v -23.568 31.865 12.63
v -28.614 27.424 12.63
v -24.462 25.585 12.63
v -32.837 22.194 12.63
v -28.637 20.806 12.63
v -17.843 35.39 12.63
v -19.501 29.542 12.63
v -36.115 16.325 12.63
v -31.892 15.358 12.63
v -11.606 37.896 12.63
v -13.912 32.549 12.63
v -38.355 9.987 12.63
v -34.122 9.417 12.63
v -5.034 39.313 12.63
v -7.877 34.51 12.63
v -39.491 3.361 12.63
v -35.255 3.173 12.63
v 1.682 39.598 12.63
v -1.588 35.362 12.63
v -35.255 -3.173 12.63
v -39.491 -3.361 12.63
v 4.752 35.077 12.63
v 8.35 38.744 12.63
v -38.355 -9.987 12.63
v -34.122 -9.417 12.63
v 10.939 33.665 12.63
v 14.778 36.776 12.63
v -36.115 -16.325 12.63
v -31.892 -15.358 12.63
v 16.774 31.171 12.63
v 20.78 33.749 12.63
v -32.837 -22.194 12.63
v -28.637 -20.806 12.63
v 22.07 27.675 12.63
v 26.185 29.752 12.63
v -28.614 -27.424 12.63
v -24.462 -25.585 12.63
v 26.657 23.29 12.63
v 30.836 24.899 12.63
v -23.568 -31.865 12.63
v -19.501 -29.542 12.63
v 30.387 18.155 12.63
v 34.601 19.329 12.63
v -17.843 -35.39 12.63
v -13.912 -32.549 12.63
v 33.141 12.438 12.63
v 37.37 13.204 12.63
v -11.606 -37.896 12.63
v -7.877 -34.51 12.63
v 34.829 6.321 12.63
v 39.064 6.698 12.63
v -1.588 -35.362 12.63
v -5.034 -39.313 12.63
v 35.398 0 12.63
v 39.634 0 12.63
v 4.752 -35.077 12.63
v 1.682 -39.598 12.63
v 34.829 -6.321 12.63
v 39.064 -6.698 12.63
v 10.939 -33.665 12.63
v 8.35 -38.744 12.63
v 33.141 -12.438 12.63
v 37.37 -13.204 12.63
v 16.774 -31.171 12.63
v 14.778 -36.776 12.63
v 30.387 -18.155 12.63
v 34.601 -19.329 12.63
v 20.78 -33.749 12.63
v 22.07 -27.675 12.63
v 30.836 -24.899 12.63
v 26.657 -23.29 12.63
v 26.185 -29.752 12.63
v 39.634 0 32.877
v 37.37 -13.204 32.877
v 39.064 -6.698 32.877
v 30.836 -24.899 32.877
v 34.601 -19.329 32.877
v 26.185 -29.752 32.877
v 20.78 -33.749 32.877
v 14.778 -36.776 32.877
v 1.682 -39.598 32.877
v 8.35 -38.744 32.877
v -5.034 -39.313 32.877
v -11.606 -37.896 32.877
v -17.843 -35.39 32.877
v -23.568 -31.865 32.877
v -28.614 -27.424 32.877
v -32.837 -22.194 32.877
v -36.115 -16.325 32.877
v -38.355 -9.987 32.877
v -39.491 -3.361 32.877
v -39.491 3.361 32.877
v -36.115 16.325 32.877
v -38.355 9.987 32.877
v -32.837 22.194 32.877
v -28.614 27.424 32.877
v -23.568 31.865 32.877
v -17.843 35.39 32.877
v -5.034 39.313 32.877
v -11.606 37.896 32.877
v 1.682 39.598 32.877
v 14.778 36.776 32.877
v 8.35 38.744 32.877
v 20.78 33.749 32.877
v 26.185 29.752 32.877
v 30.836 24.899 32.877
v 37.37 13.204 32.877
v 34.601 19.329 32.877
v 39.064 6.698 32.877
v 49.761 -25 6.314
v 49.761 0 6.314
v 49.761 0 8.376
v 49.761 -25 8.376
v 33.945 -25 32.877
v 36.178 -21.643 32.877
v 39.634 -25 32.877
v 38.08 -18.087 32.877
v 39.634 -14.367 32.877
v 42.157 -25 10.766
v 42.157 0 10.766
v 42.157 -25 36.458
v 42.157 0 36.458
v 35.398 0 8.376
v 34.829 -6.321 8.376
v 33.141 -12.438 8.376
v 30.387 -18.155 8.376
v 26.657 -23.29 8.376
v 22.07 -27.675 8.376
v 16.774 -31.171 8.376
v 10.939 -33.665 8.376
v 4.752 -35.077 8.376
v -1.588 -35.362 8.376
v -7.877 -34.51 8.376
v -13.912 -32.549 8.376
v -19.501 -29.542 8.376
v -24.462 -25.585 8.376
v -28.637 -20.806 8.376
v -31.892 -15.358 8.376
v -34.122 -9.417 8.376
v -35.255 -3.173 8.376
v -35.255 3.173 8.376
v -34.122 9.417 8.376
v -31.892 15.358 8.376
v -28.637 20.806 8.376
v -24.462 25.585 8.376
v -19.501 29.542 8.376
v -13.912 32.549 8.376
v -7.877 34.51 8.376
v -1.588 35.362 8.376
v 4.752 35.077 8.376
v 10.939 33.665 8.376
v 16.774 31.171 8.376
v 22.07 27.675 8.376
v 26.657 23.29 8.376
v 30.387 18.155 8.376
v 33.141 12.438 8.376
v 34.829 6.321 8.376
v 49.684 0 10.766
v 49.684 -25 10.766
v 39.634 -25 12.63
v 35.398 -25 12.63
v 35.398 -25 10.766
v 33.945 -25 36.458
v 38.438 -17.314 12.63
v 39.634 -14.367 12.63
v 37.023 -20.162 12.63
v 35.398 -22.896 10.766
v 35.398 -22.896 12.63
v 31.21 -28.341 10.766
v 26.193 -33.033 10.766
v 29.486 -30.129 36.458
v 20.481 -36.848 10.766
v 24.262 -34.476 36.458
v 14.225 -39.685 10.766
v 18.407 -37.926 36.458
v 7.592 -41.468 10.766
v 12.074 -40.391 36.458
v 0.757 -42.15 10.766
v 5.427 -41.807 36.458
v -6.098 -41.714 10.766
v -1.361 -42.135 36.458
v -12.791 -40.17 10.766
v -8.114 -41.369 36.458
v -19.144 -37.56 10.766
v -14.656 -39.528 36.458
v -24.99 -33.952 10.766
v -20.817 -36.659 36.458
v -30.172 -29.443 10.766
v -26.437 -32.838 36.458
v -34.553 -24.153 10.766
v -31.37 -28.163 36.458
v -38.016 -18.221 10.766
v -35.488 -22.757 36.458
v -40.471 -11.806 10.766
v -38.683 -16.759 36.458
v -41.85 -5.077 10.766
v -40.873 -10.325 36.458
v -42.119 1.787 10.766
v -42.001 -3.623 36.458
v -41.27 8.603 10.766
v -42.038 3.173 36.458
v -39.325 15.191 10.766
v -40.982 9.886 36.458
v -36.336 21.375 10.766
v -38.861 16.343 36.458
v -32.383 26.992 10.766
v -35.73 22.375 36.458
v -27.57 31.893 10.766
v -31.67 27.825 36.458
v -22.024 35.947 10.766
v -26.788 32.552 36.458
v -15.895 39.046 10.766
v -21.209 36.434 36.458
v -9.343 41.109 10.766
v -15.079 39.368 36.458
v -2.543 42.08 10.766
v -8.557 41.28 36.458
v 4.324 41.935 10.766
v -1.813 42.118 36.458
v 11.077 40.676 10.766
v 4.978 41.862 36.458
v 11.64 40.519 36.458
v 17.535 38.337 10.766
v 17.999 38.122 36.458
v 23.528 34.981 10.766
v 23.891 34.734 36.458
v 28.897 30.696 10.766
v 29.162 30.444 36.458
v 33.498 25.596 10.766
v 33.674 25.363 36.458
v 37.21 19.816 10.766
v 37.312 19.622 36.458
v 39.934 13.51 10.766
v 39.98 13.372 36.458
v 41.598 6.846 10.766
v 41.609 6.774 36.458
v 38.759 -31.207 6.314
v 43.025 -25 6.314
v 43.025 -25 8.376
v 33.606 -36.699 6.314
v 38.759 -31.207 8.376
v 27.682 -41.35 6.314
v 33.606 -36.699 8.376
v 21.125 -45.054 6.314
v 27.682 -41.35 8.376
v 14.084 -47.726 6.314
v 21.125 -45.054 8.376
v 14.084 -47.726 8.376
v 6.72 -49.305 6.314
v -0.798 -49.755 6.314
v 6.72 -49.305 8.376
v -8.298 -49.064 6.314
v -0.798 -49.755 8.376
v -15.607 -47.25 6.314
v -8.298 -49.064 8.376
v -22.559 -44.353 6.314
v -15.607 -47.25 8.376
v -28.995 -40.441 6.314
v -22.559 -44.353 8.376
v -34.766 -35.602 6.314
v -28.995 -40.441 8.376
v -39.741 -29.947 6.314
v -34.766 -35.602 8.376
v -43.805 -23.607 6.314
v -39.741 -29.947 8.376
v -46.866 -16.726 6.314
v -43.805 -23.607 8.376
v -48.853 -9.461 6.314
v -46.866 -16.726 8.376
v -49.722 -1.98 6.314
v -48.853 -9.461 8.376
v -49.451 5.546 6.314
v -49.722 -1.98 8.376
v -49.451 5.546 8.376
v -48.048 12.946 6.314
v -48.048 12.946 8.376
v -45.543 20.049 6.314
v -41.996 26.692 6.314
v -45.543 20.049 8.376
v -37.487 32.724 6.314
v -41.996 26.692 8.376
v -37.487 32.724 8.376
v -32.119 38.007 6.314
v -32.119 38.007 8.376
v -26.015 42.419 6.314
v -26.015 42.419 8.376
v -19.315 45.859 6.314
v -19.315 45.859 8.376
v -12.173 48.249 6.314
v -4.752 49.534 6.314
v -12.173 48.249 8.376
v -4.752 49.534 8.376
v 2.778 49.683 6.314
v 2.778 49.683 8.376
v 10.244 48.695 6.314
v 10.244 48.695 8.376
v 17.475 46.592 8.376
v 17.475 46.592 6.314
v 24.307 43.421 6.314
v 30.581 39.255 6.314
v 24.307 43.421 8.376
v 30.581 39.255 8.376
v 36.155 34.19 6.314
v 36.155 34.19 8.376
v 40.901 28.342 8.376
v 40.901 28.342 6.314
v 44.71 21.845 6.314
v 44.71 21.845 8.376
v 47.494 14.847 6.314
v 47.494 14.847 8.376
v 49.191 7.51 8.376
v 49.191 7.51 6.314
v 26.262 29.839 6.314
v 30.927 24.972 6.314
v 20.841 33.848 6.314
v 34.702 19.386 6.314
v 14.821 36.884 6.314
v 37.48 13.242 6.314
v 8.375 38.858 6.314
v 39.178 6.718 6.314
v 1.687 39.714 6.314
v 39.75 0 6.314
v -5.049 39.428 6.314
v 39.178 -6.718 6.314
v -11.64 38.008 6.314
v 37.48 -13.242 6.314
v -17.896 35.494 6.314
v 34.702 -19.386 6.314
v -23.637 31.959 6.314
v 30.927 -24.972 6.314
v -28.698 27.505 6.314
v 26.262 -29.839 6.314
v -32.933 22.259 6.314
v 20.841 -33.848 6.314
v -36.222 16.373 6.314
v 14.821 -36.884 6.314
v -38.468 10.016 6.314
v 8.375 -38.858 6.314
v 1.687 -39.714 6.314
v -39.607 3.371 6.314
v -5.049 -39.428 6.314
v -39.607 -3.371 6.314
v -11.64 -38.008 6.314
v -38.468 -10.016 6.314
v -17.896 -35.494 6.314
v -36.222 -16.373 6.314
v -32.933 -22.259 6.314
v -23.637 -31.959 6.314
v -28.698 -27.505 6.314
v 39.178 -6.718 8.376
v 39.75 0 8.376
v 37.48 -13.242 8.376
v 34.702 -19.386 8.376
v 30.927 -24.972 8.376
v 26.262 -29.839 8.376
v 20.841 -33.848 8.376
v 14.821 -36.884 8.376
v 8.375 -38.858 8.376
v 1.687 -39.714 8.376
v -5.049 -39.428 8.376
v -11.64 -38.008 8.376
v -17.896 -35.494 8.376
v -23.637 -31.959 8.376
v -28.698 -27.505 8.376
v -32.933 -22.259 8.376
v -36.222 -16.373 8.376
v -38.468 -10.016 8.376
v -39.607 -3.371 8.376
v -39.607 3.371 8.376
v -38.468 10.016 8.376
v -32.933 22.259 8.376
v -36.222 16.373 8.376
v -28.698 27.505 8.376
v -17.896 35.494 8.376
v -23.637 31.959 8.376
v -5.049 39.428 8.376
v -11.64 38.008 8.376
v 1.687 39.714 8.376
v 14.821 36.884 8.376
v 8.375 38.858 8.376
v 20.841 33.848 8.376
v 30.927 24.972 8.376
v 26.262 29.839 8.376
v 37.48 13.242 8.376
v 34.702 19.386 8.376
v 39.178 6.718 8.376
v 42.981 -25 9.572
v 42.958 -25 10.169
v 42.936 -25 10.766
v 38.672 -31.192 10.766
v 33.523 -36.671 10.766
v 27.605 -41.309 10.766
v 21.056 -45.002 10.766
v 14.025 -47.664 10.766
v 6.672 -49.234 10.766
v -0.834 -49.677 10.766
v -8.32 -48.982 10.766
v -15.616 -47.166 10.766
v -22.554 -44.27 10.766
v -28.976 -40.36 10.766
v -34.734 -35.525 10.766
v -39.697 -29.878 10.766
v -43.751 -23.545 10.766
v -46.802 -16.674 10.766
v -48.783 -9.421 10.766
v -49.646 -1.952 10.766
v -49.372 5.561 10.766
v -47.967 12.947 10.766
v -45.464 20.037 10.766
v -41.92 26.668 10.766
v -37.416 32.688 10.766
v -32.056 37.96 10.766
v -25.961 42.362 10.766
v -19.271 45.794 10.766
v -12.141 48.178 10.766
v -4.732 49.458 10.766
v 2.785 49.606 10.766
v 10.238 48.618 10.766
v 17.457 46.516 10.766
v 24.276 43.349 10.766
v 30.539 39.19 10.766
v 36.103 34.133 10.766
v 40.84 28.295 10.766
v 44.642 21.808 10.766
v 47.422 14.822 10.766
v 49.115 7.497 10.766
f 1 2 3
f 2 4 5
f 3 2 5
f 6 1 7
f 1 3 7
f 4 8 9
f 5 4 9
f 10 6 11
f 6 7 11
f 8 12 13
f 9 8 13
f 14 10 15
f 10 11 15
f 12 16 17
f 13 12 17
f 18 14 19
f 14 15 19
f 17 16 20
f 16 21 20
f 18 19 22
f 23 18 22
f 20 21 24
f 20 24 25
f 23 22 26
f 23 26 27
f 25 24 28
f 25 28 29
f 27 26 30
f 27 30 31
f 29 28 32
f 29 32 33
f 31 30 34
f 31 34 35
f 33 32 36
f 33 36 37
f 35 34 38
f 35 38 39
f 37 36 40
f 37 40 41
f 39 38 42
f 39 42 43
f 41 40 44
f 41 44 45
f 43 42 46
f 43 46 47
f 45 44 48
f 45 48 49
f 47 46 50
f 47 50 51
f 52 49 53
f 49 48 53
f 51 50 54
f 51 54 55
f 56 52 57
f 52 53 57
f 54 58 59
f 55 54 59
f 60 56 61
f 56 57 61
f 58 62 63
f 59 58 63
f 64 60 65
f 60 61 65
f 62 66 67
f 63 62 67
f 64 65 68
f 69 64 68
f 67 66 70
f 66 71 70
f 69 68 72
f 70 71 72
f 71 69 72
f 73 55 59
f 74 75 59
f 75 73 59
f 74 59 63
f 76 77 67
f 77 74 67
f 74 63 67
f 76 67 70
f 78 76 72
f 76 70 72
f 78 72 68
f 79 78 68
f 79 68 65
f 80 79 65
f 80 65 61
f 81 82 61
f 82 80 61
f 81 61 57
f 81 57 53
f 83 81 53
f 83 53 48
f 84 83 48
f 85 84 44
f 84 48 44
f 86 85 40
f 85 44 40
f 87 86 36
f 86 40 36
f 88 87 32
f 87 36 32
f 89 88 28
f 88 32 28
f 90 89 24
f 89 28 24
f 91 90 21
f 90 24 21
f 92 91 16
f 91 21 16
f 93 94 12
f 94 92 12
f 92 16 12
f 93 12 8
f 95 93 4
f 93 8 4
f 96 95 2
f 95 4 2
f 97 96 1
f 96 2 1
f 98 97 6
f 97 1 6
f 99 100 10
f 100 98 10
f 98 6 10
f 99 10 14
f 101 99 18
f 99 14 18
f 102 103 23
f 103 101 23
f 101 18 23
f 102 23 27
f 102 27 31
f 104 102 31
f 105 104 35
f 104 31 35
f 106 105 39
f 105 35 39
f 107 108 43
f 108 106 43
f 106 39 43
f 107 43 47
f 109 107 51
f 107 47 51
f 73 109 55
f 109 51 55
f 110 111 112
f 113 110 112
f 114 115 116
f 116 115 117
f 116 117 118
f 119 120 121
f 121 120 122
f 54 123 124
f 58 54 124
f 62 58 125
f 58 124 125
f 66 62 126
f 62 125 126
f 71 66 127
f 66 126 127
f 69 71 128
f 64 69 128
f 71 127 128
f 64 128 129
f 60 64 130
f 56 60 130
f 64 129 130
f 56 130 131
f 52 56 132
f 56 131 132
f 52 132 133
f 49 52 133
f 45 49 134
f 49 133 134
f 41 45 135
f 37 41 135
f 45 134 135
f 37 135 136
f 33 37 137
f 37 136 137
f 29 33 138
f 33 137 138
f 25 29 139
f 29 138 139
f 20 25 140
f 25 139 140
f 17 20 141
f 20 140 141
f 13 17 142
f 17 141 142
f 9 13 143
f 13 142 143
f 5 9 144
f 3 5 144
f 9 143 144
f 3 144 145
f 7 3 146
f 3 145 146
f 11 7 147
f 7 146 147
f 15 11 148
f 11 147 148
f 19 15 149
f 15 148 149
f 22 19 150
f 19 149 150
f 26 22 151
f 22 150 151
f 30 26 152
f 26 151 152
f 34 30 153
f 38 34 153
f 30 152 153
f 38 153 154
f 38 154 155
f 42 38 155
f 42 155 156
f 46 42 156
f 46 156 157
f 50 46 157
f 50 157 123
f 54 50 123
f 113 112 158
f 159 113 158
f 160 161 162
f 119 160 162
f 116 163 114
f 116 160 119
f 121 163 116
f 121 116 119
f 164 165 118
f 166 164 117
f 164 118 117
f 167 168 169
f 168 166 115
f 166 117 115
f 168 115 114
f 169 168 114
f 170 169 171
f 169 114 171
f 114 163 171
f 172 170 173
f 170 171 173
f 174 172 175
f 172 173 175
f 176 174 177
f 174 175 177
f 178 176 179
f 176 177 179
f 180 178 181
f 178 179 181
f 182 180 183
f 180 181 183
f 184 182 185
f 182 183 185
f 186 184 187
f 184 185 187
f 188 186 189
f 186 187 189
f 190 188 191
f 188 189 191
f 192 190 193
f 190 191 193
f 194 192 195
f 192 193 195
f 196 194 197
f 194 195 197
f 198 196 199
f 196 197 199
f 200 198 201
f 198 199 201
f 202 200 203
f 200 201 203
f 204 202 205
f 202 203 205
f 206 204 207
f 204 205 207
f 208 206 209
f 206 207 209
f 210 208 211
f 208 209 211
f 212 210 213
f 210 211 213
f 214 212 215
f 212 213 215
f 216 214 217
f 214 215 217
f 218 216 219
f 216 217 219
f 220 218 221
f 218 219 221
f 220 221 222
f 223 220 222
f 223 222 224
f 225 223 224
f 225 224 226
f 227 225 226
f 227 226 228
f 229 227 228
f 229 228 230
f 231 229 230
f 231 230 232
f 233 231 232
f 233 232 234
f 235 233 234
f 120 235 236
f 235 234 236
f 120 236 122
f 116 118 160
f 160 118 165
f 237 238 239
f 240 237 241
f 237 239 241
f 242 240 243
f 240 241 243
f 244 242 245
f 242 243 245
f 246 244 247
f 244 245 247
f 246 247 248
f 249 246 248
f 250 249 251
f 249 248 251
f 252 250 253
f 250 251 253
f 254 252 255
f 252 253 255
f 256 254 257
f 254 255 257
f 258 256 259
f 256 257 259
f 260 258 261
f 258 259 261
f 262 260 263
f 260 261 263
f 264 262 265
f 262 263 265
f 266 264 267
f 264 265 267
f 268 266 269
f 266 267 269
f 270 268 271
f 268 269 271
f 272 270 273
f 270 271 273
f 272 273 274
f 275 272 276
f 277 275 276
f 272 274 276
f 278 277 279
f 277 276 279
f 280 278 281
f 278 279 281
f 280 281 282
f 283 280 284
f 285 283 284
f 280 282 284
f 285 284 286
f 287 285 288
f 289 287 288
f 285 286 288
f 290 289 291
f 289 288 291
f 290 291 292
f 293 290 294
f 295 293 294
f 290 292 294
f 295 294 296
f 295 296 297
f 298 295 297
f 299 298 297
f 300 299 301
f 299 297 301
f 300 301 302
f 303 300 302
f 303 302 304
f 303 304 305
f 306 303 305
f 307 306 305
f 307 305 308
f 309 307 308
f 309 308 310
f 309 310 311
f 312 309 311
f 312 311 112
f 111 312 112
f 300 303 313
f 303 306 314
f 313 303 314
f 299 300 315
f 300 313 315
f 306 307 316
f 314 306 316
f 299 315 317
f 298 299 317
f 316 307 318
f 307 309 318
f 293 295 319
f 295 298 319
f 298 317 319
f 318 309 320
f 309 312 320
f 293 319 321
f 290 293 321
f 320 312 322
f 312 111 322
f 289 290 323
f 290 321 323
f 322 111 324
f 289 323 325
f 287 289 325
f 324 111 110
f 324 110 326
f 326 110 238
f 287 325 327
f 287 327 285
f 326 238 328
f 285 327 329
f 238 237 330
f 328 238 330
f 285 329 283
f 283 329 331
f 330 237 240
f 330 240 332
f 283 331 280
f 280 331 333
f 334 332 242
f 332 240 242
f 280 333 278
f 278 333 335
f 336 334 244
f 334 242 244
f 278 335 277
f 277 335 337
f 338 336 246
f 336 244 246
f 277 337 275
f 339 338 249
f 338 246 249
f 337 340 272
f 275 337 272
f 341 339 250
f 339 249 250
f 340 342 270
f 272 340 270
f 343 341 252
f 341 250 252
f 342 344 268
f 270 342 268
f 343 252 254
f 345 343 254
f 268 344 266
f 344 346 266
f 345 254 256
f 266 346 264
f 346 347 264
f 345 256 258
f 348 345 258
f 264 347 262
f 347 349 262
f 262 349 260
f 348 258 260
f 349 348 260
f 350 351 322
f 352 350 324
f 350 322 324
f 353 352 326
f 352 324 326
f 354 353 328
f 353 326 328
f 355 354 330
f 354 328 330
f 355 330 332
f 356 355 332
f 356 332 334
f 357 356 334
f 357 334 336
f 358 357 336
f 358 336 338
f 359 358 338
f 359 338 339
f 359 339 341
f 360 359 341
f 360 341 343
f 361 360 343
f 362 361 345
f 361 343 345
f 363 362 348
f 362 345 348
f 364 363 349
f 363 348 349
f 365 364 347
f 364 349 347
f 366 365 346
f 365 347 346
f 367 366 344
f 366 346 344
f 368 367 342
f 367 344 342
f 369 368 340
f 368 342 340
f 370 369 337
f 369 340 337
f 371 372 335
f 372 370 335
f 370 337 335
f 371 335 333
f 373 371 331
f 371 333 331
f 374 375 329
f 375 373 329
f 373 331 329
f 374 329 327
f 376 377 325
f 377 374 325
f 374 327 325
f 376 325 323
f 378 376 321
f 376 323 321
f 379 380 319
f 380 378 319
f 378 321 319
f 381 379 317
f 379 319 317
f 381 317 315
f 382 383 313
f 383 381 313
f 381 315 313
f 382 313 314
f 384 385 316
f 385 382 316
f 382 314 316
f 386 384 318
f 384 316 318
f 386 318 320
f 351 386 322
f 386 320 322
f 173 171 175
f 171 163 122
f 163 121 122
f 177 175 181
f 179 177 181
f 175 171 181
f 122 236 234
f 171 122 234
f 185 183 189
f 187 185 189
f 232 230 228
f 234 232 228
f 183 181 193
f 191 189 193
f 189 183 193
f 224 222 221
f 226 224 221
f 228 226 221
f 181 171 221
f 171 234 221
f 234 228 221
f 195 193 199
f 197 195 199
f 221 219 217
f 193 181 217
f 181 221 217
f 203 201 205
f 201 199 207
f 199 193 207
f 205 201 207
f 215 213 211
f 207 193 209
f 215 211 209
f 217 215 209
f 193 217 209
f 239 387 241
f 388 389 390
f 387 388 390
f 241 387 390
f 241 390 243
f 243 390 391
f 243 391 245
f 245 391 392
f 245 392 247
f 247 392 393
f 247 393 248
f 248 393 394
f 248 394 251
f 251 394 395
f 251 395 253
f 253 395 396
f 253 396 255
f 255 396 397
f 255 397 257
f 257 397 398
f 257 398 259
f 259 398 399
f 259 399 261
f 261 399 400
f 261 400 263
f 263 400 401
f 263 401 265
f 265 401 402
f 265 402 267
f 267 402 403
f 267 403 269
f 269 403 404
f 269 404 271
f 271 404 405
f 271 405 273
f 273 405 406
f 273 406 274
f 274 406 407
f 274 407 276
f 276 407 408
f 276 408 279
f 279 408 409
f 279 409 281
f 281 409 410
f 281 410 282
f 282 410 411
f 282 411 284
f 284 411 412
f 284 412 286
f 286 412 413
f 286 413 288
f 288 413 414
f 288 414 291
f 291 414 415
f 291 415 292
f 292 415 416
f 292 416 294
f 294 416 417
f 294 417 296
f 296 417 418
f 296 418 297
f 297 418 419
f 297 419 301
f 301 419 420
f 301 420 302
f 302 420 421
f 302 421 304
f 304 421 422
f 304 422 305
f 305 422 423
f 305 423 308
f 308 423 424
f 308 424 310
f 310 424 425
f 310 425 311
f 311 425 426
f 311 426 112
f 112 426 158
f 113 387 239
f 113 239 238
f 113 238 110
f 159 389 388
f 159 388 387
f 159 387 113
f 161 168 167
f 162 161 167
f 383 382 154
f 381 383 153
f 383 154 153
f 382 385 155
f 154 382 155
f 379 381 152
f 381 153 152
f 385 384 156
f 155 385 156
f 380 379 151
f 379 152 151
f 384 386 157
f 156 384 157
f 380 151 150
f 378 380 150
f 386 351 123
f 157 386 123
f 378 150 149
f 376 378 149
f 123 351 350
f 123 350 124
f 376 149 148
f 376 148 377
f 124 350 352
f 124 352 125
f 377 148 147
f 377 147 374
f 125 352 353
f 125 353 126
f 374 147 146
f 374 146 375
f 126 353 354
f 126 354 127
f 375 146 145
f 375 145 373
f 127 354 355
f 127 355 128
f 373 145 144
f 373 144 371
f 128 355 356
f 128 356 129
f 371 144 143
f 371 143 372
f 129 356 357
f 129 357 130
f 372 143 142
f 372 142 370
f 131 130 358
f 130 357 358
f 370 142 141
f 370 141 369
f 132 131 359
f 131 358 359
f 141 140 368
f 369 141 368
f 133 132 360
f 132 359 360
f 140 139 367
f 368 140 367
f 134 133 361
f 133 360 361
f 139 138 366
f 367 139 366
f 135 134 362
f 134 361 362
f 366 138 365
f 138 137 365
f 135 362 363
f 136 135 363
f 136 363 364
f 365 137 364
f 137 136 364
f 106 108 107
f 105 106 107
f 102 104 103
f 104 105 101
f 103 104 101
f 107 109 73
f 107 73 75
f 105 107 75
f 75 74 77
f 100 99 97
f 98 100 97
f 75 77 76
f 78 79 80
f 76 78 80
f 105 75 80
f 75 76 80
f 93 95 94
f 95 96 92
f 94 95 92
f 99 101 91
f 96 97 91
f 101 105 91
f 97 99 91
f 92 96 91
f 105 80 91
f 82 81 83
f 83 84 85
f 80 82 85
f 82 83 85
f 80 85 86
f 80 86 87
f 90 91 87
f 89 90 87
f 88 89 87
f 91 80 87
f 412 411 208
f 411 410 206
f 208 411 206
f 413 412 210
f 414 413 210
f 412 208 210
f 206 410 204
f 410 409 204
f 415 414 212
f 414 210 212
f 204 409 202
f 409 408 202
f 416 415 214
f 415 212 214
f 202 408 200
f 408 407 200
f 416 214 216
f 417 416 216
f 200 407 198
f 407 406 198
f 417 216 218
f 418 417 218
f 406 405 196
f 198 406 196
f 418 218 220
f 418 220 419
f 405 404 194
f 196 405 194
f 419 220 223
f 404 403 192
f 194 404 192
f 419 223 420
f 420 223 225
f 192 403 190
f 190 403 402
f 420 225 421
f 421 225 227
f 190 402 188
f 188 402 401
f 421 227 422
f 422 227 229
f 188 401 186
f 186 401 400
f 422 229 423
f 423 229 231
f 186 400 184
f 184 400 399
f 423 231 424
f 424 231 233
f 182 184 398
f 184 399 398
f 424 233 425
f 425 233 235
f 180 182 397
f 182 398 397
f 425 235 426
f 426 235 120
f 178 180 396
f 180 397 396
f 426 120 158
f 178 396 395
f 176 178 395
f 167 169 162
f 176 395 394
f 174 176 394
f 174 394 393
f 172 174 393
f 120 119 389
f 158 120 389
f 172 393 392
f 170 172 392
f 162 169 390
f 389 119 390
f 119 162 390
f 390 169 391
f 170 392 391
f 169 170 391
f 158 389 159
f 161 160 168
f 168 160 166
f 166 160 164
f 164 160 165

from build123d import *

# Parameters (mm, degrees)
F1_DEPTH = 25


with BuildPart() as f1:
    # F0 (on Front) → F1 (new body)
    with BuildSketch(Plane.XZ):
        Polygon((42.157266, 36.458336), (0, 36.458336), (0, 32.877419), (39.633732, 32.877419), (39.633732, 12.629625), (35.397731, 12.629625), (35.397731, 8.376406), (39.750192, 8.376406), (39.750192, 6.429029), (39.750192, 6.314471), (49.760994, 6.314471), (49.760994, 8.376406), (49.683991, 10.766225), (42.157266, 10.766225), (42.157266, 12.629625), (42.157266, 14.715909), align=None)
    extrude(amount=F1_DEPTH)

    # F0 (on Front) → F2 (revolve)
    with BuildSketch(Plane.XZ):
        Polygon((42.157266, 36.458336), (0, 36.458336), (0, 32.877419), (39.633732, 32.877419), (39.633732, 12.629625), (35.397731, 12.629625), (35.397731, 8.376406), (39.750192, 8.376406), (39.750192, 6.429029), (39.750192, 6.314471), (49.760994, 6.314471), (49.760994, 8.376406), (49.683991, 10.766225), (42.157266, 10.766225), (42.157266, 12.629625), (42.157266, 14.715909), align=None)
    revolve(axis=Axis((0, 0, 20.221634), (0, 0, -1)))


solid = f1.part
